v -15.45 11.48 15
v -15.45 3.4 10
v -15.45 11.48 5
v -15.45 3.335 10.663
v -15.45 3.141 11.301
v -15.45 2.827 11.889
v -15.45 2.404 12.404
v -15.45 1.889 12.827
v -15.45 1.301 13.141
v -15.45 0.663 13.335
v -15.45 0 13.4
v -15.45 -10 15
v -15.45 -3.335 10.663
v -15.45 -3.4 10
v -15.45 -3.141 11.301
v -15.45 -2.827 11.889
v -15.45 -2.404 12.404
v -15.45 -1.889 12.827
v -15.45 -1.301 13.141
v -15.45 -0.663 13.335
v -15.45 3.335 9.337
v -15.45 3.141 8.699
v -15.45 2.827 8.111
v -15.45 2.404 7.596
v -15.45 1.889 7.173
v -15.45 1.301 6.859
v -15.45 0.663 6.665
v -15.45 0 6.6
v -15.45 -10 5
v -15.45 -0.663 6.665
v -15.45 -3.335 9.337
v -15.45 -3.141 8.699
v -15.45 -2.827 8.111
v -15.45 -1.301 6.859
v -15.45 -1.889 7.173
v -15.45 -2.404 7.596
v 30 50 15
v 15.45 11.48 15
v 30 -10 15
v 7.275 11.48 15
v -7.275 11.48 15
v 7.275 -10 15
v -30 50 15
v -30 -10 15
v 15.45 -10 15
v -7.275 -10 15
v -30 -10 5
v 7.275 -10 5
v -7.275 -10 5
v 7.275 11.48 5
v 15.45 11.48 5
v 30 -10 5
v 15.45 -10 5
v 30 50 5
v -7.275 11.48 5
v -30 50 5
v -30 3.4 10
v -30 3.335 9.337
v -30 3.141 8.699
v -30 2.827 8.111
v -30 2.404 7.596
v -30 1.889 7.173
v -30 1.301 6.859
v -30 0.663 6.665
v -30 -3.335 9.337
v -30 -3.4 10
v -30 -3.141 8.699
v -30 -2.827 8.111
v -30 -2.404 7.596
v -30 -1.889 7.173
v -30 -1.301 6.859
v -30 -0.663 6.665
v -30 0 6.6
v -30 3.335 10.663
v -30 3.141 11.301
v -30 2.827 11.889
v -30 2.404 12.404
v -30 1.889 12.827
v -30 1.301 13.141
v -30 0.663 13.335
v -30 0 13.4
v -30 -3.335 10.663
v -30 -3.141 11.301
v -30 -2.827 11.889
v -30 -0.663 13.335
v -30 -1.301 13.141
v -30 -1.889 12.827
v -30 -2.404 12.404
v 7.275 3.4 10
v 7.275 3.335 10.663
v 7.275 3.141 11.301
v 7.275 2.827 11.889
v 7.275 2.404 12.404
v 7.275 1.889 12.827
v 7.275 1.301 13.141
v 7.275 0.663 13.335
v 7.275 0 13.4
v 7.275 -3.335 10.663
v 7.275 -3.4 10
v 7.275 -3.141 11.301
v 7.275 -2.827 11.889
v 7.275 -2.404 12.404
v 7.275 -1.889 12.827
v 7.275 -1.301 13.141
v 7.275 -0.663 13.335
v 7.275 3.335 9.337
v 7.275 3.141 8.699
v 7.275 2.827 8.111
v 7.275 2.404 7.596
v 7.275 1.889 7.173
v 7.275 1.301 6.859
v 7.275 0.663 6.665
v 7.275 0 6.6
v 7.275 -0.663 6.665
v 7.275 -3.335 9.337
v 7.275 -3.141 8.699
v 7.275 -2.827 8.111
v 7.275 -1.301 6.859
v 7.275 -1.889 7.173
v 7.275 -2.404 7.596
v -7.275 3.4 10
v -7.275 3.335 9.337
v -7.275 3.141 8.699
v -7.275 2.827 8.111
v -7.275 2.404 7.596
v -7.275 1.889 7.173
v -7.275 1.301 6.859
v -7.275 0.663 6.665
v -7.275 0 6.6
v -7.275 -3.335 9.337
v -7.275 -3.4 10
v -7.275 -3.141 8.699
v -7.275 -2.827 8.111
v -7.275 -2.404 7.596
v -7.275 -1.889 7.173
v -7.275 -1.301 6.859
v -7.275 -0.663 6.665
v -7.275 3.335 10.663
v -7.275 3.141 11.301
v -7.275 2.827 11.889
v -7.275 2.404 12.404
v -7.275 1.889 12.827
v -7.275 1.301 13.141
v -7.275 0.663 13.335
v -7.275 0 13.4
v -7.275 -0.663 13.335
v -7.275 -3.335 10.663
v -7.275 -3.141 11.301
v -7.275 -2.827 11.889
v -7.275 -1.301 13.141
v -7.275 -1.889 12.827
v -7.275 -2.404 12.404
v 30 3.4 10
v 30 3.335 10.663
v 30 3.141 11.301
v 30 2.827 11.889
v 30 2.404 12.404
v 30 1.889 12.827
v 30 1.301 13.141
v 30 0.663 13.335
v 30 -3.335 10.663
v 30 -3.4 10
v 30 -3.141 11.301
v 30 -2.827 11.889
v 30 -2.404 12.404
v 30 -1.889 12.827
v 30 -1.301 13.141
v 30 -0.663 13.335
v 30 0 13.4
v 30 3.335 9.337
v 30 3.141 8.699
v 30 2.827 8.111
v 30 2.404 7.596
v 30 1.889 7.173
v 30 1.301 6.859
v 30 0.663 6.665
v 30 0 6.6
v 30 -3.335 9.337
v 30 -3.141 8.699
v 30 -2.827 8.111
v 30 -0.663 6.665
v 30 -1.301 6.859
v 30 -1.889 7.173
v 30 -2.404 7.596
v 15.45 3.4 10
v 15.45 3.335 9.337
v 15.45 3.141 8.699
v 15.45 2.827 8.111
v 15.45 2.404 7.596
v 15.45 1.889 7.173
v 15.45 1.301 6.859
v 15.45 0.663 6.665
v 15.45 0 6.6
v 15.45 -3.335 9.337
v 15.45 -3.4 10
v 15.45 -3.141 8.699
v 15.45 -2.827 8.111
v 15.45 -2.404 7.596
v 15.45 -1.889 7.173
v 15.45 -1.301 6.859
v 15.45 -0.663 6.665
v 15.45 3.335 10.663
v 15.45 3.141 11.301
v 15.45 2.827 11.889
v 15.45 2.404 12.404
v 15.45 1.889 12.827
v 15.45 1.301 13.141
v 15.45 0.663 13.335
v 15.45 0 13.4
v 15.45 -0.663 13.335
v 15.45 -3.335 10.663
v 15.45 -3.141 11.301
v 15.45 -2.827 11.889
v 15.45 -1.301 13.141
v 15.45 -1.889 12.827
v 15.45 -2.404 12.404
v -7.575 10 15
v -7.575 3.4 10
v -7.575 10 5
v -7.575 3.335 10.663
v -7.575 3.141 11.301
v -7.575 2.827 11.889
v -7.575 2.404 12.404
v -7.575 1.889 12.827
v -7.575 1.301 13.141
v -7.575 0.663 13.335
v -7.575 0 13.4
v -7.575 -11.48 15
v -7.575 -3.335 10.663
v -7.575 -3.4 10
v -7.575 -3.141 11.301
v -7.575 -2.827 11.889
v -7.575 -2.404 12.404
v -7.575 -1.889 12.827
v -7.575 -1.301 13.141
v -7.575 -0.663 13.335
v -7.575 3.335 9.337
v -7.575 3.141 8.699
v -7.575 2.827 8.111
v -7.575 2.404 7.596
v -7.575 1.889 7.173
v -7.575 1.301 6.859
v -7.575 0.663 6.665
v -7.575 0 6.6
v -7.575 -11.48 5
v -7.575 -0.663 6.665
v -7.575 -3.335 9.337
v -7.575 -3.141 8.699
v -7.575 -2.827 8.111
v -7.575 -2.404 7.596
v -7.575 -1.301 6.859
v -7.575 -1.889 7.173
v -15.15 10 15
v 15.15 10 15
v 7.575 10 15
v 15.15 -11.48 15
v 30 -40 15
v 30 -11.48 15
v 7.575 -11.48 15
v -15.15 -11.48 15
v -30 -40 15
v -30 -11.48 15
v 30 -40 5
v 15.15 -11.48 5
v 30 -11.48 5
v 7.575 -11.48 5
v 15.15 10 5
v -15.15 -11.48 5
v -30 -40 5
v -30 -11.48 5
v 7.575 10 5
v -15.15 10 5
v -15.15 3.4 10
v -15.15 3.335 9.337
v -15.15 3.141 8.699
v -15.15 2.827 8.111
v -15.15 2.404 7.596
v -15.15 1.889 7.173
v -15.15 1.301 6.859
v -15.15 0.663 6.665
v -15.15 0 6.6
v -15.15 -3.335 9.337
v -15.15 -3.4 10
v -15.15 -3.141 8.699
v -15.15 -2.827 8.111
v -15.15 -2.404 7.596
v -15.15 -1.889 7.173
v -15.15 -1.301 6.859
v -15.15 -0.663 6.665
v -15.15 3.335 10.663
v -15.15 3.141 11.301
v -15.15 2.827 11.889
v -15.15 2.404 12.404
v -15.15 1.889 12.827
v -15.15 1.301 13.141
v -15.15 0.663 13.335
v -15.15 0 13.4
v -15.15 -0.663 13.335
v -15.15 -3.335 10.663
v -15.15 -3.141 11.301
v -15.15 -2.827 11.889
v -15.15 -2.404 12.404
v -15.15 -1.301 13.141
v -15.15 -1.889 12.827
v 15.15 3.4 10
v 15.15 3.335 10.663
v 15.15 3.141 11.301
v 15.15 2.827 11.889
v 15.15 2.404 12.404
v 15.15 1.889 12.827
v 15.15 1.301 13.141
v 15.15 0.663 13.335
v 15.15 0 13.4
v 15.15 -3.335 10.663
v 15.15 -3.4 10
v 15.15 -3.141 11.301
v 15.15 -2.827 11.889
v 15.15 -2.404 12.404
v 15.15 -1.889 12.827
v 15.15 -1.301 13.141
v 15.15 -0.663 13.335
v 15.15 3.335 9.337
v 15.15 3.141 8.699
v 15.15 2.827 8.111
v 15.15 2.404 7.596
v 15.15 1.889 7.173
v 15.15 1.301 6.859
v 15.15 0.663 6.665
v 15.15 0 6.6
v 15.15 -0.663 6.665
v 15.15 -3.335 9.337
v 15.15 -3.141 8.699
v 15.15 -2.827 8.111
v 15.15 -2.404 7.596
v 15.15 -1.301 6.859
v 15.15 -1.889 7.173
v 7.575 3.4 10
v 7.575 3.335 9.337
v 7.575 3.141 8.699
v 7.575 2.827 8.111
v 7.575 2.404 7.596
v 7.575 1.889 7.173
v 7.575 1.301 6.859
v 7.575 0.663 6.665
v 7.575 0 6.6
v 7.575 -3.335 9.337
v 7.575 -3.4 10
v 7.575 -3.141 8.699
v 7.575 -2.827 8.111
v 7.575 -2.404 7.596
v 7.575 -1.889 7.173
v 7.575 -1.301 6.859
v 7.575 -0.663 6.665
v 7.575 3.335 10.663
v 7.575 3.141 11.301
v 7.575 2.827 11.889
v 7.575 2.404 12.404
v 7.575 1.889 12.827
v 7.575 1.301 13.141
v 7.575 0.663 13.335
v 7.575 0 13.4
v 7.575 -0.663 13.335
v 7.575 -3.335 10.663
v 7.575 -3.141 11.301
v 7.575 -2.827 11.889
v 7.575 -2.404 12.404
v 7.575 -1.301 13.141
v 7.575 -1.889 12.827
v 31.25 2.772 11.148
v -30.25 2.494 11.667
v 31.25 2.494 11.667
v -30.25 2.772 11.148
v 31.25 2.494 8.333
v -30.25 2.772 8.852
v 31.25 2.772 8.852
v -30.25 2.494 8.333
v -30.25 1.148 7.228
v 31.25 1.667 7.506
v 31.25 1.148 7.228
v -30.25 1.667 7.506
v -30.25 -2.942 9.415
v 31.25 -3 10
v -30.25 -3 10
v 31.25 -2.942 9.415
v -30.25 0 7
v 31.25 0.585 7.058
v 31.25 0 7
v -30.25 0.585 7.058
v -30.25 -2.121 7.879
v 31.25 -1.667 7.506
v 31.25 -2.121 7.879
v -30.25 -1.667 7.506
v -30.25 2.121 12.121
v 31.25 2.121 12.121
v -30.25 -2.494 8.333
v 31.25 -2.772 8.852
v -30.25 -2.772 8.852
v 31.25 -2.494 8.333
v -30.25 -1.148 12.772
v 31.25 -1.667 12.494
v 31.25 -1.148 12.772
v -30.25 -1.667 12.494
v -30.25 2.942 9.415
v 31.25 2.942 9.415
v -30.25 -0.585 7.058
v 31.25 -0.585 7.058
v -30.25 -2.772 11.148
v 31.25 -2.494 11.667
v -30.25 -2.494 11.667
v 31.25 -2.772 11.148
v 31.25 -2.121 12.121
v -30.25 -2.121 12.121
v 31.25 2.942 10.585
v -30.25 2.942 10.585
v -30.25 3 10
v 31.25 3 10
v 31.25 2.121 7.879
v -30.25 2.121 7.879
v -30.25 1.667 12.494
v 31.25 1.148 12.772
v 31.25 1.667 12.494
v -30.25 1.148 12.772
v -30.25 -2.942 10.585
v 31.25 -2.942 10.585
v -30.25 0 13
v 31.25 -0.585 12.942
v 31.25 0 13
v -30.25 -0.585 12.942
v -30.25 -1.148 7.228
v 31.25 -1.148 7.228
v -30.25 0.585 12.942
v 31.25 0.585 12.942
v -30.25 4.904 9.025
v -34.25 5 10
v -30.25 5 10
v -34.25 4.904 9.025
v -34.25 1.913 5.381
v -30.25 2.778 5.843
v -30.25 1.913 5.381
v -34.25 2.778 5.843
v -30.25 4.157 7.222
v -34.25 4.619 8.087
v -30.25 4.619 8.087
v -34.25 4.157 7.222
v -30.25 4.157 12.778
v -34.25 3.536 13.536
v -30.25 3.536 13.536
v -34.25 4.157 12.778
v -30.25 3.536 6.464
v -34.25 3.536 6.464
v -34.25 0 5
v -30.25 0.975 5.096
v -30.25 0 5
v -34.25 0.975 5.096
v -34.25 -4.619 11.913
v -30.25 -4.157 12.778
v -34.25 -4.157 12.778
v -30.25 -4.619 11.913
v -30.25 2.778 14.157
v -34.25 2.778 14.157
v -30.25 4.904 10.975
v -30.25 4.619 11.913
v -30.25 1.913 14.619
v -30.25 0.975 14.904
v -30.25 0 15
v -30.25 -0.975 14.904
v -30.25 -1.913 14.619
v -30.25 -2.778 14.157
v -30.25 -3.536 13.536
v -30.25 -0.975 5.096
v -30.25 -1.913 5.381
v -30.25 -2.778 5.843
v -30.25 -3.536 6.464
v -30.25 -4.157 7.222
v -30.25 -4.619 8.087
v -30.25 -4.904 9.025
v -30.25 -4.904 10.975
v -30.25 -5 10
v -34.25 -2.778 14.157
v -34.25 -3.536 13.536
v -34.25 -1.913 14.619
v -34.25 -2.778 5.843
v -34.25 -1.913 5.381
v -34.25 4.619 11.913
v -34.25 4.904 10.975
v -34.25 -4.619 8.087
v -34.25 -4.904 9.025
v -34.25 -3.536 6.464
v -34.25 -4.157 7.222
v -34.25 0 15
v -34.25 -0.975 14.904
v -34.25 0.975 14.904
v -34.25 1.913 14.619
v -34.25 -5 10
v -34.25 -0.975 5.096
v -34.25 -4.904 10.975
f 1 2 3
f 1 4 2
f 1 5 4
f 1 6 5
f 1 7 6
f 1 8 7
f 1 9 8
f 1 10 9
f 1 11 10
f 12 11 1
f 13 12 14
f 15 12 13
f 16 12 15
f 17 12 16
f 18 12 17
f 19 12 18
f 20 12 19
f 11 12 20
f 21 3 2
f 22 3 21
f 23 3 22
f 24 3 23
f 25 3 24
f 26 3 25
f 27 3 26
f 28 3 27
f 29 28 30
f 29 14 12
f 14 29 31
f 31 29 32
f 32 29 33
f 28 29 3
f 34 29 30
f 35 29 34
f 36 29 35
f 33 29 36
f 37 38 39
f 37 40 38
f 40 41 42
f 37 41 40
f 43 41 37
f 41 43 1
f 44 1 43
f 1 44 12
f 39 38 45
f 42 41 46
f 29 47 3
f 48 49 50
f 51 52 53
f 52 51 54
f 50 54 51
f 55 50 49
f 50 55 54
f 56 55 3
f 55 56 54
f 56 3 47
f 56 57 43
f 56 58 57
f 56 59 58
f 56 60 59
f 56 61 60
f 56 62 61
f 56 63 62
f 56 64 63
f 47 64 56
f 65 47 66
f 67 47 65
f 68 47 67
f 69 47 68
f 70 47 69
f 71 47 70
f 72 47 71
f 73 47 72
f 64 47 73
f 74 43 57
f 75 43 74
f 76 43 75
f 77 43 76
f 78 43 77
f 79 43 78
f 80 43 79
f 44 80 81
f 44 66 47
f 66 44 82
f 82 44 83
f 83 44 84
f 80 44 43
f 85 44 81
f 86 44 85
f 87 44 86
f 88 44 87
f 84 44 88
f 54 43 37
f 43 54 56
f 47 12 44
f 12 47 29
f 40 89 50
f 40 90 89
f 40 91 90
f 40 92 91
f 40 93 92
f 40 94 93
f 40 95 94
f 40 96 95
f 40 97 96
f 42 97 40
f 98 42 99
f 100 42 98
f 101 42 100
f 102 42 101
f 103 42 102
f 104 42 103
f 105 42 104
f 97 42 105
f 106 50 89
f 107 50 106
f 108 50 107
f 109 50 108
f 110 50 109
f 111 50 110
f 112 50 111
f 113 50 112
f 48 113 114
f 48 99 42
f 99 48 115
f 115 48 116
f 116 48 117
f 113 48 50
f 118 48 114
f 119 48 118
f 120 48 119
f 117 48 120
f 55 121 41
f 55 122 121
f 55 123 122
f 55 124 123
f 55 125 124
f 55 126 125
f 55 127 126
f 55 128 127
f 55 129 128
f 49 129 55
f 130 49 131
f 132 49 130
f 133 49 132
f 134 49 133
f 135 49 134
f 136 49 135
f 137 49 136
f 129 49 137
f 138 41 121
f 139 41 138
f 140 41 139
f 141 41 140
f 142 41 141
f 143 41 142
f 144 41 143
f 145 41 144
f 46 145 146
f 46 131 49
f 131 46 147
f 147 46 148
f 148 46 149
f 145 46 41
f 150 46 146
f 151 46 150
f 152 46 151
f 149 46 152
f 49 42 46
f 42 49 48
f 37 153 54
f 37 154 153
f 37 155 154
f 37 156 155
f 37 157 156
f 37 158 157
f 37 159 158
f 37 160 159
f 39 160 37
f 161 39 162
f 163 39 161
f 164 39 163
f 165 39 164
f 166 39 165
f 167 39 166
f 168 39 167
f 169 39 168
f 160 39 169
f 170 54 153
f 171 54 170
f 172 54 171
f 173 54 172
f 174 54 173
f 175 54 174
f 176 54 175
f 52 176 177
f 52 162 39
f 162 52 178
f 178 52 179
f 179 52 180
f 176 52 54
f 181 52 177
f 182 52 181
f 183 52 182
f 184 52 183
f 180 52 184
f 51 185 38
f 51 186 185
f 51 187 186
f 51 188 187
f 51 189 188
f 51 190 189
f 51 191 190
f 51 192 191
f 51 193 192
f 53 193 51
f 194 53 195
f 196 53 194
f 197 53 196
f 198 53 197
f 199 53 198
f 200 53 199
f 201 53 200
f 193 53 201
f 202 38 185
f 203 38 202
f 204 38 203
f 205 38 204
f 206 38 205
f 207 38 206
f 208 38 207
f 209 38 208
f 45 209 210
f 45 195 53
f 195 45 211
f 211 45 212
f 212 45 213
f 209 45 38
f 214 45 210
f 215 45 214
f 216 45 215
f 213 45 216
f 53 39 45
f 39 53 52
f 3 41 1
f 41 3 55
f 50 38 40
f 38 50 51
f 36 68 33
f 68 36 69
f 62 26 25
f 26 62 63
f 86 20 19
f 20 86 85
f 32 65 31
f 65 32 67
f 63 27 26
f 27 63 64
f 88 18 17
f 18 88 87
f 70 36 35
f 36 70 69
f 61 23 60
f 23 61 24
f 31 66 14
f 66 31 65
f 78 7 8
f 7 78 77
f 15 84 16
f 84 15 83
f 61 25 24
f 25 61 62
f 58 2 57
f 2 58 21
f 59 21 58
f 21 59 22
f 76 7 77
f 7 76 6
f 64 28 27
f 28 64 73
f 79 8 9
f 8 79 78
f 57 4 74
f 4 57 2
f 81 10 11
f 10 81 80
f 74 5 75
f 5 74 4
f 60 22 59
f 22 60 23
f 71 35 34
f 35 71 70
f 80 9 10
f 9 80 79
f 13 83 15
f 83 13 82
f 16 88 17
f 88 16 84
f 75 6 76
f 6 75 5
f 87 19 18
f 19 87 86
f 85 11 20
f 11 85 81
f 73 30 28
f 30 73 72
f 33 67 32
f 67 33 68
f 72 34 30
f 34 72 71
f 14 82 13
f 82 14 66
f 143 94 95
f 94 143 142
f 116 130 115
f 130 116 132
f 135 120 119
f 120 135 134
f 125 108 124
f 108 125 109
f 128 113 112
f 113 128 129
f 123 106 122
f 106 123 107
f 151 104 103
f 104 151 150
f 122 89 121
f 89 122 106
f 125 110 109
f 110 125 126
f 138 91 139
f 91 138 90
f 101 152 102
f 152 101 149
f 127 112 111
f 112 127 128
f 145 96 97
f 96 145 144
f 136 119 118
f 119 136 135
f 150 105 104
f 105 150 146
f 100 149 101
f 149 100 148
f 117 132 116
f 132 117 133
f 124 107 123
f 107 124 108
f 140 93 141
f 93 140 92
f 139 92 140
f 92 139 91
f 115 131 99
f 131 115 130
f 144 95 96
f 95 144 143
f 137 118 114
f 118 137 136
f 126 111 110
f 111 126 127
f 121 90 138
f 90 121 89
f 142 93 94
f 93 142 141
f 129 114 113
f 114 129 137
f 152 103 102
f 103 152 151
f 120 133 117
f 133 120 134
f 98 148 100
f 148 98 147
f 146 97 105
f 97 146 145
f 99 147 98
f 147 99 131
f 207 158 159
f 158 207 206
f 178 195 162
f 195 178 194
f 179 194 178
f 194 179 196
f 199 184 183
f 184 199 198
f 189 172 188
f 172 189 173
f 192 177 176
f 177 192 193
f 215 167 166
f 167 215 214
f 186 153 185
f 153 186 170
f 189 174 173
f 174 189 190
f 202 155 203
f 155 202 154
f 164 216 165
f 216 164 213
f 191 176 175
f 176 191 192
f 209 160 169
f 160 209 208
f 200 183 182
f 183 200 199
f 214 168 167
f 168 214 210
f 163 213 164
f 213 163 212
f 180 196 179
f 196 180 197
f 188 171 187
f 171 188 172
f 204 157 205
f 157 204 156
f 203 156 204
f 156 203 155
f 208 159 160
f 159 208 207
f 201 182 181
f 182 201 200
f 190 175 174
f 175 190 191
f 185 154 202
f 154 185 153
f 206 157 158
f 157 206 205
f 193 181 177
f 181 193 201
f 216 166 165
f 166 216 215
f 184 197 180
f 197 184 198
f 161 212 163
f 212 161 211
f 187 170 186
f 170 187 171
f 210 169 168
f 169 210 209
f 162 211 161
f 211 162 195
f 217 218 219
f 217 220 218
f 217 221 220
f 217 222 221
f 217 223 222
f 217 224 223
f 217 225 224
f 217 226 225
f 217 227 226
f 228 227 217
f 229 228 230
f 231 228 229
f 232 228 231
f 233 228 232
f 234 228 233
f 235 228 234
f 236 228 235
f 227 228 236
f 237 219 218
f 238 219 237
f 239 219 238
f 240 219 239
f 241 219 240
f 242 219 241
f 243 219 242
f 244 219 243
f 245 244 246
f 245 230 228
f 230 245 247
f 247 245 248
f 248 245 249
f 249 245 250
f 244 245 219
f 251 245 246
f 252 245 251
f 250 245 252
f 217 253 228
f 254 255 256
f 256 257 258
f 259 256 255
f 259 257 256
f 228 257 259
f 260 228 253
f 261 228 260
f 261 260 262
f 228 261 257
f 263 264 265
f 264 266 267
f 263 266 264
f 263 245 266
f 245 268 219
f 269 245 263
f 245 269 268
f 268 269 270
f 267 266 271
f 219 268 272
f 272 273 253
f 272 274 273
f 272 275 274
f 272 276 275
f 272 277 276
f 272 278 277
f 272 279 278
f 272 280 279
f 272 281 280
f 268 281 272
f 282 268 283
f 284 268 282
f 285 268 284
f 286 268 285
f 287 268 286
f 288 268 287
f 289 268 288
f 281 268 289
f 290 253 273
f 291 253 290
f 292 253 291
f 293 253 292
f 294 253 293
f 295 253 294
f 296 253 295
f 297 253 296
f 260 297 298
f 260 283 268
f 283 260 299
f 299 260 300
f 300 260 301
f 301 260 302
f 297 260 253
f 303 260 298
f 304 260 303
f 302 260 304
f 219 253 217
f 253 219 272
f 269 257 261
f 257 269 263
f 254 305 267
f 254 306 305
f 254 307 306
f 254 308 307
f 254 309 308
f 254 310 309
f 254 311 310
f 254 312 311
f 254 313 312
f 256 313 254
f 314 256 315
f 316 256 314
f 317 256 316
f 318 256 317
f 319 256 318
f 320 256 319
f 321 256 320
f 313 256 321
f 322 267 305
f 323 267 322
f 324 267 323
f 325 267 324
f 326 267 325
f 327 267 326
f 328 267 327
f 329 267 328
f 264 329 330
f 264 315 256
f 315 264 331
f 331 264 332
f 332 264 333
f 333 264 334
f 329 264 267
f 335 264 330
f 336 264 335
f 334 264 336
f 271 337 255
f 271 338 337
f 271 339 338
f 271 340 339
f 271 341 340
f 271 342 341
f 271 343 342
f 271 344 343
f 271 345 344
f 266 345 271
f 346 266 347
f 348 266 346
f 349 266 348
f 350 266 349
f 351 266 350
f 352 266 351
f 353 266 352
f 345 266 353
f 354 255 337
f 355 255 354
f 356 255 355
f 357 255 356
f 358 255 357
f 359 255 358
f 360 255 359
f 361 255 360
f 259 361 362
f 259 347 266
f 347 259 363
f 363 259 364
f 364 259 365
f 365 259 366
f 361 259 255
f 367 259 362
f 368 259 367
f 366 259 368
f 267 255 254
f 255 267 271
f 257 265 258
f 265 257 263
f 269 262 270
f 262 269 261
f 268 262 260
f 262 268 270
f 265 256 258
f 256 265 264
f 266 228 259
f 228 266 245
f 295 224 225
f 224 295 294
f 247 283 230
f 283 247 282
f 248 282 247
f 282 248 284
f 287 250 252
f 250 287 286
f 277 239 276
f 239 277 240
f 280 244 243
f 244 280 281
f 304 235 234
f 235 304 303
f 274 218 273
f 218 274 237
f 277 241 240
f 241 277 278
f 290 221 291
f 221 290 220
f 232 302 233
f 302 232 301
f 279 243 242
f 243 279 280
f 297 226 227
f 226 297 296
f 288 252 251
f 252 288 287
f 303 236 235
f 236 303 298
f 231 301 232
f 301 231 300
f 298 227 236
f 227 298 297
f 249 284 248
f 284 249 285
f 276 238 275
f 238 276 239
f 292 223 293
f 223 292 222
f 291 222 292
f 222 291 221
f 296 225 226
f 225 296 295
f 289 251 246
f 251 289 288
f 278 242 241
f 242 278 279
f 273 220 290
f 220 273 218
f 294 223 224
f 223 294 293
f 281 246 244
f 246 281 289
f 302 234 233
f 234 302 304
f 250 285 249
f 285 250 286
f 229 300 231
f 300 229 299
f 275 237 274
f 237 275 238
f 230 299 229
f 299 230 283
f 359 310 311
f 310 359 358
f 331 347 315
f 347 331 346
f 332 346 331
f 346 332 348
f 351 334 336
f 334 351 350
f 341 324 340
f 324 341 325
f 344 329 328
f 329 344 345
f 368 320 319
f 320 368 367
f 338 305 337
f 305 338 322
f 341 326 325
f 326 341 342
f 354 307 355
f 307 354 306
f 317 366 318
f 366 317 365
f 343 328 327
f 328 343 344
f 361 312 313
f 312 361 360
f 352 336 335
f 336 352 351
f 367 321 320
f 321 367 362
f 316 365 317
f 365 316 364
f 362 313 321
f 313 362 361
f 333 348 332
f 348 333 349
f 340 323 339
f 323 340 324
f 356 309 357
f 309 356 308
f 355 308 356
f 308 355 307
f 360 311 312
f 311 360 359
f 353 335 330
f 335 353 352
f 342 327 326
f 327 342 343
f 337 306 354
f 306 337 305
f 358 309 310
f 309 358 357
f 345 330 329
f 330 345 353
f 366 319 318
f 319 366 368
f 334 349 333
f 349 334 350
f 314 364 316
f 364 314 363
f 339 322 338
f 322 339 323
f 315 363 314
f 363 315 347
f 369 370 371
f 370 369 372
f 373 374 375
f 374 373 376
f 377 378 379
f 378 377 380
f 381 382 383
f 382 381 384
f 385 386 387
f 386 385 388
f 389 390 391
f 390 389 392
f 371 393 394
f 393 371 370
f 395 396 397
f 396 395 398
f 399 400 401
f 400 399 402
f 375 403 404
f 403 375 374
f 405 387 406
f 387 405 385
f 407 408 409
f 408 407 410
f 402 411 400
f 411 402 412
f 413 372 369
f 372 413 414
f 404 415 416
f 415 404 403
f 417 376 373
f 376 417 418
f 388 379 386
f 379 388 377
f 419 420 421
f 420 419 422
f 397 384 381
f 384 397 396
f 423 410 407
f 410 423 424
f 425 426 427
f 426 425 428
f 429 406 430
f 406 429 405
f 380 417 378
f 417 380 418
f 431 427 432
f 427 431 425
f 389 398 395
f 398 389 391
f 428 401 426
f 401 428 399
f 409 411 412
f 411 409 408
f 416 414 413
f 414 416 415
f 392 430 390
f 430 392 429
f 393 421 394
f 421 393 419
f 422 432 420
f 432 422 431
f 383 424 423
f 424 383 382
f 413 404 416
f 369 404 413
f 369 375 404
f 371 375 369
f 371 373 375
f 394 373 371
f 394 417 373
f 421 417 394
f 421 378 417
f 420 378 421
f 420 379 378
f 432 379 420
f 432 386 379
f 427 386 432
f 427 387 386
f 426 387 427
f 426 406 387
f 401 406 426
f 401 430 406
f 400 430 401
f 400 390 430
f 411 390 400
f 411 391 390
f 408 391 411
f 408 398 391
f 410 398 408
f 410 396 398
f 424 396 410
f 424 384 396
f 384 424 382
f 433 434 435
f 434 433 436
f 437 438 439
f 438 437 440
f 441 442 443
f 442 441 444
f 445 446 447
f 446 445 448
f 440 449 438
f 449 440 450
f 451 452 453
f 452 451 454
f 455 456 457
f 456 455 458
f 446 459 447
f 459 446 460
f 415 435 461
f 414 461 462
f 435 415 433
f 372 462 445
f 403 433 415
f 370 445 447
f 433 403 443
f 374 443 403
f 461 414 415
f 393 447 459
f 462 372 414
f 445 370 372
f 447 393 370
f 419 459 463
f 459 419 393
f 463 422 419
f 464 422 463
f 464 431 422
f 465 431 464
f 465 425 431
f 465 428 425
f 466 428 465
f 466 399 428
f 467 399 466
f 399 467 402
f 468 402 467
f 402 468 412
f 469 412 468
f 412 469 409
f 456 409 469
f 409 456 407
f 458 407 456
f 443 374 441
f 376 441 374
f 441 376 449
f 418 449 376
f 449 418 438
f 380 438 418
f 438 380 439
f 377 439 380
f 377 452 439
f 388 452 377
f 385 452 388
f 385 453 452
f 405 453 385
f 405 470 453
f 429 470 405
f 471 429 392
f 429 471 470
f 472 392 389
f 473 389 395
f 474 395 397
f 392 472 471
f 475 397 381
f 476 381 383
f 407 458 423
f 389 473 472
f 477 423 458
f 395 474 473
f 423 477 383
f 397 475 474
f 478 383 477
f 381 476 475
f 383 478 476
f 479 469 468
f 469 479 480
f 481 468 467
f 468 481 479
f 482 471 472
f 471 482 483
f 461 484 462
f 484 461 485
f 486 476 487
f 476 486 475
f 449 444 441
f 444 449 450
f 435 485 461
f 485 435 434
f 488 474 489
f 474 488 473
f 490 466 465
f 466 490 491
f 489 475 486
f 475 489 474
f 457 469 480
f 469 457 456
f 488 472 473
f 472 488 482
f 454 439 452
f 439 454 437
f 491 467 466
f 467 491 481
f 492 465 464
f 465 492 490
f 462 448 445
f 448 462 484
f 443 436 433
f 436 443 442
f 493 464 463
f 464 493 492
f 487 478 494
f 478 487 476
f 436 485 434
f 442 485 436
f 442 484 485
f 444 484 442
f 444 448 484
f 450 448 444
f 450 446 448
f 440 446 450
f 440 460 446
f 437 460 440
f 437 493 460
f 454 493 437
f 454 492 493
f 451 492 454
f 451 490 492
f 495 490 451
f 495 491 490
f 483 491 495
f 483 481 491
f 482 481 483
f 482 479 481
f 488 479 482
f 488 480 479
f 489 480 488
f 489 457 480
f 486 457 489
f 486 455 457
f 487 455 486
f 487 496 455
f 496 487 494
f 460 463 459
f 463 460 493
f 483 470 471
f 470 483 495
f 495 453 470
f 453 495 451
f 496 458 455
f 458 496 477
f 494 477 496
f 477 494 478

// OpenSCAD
$fn = 32;

// ------------------------------------------------------------------------
// Butt hinge: hinge 60 mm, leaf swung 0 deg
// Every part is its own module, assembly() places every instance.
// ------------------------------------------------------------------------

// --- part 1 ---
module hinge_base() {
  difference() {
    union() {
      translate([-30, -10, -5]) cube([14.55, 60, 10]);
      translate([-7.275, -10, -5]) cube([14.55, 60, 10]);
      translate([15.45, -10, -5]) cube([14.55, 60, 10]);
      translate([-30, 11.48, -5]) cube([60, 38.52, 10]);
    }
    translate([-22.725, 0, 0]) rotate([0, 90, 0]) cylinder(h = 16.55, d = 6.8, center = true);
    translate([0, 0, 0]) rotate([0, 90, 0]) cylinder(h = 16.55, d = 6.8, center = true);
    translate([22.725, 0, 0]) rotate([0, 90, 0]) cylinder(h = 16.55, d = 6.8, center = true);
  }
}

// --- part 2 ---
module hinge_mover() {
  difference() {
    union() {
      translate([-15.15, -40, -5]) cube([7.575, 50, 10]);
      translate([7.575, -40, -5]) cube([7.575, 50, 10]);
      translate([-30, -40, -5]) cube([60, 28.52, 10]);
    }
    translate([-11.362, 0, 0]) rotate([0, 90, 0]) cylinder(h = 9.575, d = 6.8, center = true);
    translate([11.362, 0, 0]) rotate([0, 90, 0]) cylinder(h = 9.575, d = 6.8, center = true);
  }
}

// --- part 3 ---
module hinge_pin() {
  rotate([0, 90, 0]) cylinder(h = 62.5, d = 6, center = true);
  translate([-34.25, 0, 0]) rotate([0, 90, 0]) cylinder(h = 4, d = 10);
}

// --- assembly ---
module assembly() {
  color([0.80, 0.24, 0.20]) translate([0, 0, 10]) rotate([0, 0, 0]) hinge_base();
  color([0.20, 0.45, 0.75]) translate([0, 0, 10]) rotate([0, 0, 0]) hinge_mover();
  color([0.25, 0.62, 0.32]) translate([0, 0, 10]) rotate([0, 0, 0]) hinge_pin();
}

assembly();
